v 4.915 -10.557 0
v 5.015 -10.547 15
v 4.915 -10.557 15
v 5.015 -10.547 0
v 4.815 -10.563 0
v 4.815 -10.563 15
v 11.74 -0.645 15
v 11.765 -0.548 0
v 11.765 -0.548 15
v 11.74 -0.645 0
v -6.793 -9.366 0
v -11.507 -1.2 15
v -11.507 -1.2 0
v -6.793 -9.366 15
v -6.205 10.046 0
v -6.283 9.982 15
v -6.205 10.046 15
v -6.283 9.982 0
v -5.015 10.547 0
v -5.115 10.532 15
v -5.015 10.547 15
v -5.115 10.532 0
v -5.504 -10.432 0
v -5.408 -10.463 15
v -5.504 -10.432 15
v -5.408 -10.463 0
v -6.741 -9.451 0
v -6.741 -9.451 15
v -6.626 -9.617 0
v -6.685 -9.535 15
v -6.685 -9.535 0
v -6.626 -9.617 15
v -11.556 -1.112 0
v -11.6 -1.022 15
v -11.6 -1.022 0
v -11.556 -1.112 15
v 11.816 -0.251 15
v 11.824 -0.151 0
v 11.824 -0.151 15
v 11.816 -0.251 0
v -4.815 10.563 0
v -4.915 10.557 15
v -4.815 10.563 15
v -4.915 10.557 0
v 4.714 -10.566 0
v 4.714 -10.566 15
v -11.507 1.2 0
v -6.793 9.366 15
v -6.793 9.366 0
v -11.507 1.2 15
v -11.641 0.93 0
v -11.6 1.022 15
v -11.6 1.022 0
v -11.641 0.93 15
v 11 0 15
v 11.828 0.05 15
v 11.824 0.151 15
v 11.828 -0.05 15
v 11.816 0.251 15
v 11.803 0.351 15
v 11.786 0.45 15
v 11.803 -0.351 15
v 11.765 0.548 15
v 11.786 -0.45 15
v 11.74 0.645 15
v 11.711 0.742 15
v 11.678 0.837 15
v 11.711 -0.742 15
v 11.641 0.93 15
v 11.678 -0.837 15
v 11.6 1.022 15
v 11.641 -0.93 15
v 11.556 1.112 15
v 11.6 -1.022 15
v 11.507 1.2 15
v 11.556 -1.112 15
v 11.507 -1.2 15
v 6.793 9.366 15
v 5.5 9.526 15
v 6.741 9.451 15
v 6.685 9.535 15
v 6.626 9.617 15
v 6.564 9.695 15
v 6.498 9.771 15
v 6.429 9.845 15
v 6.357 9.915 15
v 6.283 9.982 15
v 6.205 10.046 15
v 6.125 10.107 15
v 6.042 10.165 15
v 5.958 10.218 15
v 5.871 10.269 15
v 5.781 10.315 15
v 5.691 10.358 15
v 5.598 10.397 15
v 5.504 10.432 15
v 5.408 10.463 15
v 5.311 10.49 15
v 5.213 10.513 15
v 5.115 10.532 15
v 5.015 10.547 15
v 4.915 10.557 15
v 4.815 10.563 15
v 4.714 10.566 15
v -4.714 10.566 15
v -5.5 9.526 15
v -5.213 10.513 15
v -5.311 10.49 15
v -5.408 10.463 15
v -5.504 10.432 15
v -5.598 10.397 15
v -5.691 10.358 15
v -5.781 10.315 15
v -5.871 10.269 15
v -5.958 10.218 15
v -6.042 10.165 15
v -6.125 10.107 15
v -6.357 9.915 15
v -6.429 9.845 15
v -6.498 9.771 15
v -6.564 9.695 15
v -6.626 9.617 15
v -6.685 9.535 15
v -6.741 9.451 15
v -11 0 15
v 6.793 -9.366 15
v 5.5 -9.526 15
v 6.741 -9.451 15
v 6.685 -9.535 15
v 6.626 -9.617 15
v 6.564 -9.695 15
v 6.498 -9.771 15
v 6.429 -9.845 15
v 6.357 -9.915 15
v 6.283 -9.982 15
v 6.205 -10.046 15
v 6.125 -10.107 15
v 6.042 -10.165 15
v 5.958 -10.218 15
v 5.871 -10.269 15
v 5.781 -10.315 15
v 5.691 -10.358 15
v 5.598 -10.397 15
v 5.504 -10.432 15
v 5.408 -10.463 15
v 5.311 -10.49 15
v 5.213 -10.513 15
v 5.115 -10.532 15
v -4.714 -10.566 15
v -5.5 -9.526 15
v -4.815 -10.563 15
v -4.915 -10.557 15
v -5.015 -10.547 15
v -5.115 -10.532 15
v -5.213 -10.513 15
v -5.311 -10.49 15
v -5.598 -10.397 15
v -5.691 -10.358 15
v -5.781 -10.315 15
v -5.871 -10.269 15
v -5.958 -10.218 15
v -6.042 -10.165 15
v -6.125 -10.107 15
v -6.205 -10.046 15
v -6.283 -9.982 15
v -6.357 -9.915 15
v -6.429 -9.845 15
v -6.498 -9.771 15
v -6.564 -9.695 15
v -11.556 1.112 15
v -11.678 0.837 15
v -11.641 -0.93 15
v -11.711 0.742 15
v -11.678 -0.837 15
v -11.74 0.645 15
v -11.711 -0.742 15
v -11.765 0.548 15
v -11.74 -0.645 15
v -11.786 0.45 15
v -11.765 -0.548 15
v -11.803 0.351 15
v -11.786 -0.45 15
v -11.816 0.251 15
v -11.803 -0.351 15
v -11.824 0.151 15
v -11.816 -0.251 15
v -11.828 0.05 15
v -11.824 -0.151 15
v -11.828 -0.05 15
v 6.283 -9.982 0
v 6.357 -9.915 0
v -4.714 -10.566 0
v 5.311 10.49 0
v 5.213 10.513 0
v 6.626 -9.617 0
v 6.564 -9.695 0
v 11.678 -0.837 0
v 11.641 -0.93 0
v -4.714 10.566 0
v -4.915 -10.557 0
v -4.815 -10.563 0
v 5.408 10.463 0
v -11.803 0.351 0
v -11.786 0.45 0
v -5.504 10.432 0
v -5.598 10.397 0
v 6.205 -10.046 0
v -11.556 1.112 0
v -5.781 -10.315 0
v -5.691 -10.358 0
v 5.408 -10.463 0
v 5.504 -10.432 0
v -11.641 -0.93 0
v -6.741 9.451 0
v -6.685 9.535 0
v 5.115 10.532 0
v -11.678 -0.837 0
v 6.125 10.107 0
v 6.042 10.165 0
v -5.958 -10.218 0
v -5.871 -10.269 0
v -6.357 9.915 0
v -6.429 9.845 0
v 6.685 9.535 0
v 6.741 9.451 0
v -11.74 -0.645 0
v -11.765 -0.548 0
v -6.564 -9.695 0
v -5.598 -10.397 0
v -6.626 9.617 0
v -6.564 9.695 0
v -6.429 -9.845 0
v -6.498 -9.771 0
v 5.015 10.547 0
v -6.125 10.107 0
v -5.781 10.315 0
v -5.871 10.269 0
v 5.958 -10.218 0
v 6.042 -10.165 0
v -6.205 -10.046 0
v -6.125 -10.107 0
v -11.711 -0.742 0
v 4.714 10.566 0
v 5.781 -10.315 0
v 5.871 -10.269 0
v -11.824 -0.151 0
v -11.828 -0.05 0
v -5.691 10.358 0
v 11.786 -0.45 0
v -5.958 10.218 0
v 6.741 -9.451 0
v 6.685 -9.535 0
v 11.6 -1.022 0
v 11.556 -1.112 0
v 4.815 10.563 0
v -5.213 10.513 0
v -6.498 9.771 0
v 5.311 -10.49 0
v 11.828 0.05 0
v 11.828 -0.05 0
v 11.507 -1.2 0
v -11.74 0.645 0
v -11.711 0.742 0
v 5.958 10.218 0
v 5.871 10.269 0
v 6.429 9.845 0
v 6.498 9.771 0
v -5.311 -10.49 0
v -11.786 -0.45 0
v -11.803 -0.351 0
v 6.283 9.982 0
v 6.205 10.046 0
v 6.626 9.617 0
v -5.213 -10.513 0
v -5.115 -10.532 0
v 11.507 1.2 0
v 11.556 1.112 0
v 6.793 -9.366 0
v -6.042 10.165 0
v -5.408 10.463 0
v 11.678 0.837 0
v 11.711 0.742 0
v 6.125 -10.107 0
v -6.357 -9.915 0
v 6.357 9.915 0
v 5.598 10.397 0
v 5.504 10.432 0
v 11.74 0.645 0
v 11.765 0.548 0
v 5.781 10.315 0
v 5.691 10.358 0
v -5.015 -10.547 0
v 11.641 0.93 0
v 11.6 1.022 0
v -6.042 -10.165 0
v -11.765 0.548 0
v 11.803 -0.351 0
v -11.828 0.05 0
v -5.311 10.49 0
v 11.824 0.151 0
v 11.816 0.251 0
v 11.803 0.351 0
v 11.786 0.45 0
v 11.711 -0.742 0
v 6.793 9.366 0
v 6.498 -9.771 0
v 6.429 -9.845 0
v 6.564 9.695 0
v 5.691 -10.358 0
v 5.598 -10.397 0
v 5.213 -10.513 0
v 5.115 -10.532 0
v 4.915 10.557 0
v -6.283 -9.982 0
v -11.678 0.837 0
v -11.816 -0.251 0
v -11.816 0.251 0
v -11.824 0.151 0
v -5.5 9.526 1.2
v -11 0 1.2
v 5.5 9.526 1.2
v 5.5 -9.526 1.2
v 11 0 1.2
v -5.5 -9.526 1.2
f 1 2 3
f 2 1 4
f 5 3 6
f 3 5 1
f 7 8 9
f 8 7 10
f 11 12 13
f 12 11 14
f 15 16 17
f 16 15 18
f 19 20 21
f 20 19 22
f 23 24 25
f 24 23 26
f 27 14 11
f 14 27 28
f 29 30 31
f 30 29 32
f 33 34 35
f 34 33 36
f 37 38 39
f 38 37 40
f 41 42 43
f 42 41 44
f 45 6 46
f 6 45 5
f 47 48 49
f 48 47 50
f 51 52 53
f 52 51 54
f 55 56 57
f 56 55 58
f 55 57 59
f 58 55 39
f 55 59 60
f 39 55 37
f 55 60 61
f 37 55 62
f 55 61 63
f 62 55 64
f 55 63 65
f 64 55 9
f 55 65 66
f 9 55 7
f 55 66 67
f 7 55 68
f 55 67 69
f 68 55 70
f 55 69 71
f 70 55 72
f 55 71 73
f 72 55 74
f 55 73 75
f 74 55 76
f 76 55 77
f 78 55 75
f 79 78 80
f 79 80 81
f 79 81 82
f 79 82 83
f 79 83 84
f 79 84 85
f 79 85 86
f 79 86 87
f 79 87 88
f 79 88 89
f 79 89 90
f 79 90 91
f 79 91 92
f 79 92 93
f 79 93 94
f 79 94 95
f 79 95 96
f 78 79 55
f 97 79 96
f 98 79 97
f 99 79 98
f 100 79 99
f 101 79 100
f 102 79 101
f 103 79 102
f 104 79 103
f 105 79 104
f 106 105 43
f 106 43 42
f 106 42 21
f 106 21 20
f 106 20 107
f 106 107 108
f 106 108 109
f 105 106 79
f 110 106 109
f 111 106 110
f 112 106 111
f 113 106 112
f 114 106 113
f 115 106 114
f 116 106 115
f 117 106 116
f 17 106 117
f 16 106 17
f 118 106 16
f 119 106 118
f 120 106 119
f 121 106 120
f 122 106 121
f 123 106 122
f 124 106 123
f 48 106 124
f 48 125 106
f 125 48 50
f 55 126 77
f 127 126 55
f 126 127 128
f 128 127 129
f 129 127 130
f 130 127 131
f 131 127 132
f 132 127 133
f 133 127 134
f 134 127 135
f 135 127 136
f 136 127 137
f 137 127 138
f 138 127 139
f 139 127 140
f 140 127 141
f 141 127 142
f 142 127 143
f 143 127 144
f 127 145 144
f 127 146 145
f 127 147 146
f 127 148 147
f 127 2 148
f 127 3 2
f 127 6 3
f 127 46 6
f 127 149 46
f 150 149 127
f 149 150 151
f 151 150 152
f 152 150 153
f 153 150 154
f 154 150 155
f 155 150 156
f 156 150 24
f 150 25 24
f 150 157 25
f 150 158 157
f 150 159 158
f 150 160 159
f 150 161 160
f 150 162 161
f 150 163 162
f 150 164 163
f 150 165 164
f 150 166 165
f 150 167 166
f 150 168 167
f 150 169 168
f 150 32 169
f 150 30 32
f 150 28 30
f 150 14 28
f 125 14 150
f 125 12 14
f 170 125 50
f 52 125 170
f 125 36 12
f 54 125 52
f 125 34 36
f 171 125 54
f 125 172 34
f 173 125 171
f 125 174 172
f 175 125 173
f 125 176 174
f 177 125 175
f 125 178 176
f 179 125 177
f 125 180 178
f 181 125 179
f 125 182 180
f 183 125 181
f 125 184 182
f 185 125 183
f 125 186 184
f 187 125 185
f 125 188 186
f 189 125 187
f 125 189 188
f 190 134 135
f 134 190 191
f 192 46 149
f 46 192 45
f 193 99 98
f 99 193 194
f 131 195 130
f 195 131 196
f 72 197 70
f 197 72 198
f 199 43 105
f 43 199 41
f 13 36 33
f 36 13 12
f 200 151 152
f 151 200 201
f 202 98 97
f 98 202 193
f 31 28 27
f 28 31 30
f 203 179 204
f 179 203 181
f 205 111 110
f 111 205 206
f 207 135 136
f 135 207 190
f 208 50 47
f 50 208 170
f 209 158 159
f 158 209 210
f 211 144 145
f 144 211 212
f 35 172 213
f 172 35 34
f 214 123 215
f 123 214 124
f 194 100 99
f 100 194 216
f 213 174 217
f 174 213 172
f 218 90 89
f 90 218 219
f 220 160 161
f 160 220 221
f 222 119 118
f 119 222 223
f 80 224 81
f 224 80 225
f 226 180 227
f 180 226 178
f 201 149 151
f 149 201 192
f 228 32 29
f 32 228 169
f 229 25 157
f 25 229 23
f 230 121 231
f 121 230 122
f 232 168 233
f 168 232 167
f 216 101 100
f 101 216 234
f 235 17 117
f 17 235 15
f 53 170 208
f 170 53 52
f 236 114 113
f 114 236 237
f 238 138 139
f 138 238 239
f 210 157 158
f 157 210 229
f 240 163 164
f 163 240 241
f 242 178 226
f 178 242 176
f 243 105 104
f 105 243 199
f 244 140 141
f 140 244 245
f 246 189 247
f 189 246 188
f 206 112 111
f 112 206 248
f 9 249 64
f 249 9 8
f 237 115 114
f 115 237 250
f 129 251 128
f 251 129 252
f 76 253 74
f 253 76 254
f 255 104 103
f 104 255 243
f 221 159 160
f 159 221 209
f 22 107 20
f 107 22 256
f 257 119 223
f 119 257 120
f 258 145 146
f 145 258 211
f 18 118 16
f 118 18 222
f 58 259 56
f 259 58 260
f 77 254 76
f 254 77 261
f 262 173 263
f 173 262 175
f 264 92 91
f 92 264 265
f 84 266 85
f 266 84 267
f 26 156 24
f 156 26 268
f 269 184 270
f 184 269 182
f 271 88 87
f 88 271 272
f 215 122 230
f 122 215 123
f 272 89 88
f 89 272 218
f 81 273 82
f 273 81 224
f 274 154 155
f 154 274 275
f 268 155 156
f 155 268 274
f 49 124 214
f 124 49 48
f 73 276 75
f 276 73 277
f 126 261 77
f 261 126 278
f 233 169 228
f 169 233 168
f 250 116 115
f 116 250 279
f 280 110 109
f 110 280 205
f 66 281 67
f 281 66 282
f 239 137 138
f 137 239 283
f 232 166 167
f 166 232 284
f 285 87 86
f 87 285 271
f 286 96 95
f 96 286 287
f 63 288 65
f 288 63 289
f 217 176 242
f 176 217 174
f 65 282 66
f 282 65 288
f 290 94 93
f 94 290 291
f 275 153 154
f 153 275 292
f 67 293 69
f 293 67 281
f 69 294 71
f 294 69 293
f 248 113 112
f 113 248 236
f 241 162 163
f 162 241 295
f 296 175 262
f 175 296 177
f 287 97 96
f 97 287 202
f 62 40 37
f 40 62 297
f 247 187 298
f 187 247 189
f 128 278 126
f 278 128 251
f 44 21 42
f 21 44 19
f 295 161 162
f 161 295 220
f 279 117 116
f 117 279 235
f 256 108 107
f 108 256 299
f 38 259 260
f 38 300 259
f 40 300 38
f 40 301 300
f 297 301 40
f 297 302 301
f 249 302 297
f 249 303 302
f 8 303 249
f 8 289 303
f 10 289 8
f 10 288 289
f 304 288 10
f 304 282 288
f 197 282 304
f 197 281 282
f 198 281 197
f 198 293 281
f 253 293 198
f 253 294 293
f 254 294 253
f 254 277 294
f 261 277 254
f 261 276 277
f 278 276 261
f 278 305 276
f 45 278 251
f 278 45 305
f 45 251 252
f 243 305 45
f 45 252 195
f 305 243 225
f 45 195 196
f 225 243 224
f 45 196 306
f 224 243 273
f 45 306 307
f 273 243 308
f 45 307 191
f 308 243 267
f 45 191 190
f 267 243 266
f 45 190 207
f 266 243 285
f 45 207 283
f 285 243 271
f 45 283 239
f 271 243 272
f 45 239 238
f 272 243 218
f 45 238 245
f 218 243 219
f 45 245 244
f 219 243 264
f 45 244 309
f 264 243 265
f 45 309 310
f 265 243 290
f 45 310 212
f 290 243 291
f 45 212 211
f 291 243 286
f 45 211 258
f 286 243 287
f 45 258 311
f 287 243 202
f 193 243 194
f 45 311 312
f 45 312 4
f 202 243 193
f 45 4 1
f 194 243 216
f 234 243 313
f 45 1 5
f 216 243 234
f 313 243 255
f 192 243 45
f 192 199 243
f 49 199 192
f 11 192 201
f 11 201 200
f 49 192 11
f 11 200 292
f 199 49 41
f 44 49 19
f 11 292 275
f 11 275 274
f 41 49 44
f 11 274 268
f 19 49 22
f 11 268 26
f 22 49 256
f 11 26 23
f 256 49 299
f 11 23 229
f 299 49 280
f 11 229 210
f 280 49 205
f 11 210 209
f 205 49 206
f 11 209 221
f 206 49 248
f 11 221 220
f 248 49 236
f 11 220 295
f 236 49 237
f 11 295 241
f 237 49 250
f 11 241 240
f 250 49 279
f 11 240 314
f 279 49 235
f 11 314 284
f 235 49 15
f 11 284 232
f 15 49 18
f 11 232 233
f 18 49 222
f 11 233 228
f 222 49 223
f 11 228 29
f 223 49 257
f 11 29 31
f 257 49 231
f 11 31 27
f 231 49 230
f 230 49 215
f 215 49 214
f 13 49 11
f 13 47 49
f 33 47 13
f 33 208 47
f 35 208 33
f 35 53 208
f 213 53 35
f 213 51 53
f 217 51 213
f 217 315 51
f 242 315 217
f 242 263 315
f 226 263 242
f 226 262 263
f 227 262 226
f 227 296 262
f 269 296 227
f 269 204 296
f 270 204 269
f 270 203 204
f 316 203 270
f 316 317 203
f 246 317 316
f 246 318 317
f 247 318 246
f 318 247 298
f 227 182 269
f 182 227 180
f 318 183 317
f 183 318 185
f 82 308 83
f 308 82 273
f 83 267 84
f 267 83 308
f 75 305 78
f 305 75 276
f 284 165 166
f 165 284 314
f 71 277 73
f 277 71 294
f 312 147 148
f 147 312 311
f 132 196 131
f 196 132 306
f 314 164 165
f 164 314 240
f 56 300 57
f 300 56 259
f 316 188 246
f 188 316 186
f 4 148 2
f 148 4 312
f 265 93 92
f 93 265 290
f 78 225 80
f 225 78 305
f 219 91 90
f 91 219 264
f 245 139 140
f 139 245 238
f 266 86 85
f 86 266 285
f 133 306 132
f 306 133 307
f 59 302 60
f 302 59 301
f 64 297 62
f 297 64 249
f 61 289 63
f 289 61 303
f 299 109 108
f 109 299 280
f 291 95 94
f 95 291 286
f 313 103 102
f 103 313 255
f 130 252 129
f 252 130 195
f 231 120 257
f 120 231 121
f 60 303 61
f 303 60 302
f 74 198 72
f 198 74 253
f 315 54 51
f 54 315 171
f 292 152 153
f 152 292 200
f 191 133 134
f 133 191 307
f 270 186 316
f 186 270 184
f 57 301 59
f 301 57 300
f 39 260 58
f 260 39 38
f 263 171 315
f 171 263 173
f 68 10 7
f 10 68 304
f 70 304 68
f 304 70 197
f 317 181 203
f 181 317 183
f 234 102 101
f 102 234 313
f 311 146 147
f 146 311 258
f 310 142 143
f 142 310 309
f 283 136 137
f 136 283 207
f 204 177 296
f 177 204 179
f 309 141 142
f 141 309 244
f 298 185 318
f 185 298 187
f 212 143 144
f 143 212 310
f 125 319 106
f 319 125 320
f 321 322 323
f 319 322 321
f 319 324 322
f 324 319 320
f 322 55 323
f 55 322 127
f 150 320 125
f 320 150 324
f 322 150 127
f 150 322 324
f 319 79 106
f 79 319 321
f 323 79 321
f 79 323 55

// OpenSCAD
$fn=150;
nutDiameter=22;
coverHeight=15;
coverThickness= 1.2;



nutCover();

module nutCover(){
    externalDiameter=nutDiameter+2*coverThickness;

        difference(){

           nutSolid(externalDiameter,coverHeight,coverThickness*2);
           translate([0,0,coverThickness]) nutSolid(nutDiameter,coverHeight);
      }
       

    
}

module nutSolid(diameter,height,cr){
    linear_extrude(height)
        if(cr) roundedPolygon(diameter,cr);
        else circle($fn=6,d=diameter);
}


module roundedPolygon(l, cr){
    sides = 6;
    r = cr;
    offset(r) offset(-r){
        circle(d=l,$fn=sides);
        for (i = [0: sides]){
          rotate([0,0, 360/sides * i]) translate([l/2+cr/2 ,0,0])
            circle(d=r);
        }
    } 
}
